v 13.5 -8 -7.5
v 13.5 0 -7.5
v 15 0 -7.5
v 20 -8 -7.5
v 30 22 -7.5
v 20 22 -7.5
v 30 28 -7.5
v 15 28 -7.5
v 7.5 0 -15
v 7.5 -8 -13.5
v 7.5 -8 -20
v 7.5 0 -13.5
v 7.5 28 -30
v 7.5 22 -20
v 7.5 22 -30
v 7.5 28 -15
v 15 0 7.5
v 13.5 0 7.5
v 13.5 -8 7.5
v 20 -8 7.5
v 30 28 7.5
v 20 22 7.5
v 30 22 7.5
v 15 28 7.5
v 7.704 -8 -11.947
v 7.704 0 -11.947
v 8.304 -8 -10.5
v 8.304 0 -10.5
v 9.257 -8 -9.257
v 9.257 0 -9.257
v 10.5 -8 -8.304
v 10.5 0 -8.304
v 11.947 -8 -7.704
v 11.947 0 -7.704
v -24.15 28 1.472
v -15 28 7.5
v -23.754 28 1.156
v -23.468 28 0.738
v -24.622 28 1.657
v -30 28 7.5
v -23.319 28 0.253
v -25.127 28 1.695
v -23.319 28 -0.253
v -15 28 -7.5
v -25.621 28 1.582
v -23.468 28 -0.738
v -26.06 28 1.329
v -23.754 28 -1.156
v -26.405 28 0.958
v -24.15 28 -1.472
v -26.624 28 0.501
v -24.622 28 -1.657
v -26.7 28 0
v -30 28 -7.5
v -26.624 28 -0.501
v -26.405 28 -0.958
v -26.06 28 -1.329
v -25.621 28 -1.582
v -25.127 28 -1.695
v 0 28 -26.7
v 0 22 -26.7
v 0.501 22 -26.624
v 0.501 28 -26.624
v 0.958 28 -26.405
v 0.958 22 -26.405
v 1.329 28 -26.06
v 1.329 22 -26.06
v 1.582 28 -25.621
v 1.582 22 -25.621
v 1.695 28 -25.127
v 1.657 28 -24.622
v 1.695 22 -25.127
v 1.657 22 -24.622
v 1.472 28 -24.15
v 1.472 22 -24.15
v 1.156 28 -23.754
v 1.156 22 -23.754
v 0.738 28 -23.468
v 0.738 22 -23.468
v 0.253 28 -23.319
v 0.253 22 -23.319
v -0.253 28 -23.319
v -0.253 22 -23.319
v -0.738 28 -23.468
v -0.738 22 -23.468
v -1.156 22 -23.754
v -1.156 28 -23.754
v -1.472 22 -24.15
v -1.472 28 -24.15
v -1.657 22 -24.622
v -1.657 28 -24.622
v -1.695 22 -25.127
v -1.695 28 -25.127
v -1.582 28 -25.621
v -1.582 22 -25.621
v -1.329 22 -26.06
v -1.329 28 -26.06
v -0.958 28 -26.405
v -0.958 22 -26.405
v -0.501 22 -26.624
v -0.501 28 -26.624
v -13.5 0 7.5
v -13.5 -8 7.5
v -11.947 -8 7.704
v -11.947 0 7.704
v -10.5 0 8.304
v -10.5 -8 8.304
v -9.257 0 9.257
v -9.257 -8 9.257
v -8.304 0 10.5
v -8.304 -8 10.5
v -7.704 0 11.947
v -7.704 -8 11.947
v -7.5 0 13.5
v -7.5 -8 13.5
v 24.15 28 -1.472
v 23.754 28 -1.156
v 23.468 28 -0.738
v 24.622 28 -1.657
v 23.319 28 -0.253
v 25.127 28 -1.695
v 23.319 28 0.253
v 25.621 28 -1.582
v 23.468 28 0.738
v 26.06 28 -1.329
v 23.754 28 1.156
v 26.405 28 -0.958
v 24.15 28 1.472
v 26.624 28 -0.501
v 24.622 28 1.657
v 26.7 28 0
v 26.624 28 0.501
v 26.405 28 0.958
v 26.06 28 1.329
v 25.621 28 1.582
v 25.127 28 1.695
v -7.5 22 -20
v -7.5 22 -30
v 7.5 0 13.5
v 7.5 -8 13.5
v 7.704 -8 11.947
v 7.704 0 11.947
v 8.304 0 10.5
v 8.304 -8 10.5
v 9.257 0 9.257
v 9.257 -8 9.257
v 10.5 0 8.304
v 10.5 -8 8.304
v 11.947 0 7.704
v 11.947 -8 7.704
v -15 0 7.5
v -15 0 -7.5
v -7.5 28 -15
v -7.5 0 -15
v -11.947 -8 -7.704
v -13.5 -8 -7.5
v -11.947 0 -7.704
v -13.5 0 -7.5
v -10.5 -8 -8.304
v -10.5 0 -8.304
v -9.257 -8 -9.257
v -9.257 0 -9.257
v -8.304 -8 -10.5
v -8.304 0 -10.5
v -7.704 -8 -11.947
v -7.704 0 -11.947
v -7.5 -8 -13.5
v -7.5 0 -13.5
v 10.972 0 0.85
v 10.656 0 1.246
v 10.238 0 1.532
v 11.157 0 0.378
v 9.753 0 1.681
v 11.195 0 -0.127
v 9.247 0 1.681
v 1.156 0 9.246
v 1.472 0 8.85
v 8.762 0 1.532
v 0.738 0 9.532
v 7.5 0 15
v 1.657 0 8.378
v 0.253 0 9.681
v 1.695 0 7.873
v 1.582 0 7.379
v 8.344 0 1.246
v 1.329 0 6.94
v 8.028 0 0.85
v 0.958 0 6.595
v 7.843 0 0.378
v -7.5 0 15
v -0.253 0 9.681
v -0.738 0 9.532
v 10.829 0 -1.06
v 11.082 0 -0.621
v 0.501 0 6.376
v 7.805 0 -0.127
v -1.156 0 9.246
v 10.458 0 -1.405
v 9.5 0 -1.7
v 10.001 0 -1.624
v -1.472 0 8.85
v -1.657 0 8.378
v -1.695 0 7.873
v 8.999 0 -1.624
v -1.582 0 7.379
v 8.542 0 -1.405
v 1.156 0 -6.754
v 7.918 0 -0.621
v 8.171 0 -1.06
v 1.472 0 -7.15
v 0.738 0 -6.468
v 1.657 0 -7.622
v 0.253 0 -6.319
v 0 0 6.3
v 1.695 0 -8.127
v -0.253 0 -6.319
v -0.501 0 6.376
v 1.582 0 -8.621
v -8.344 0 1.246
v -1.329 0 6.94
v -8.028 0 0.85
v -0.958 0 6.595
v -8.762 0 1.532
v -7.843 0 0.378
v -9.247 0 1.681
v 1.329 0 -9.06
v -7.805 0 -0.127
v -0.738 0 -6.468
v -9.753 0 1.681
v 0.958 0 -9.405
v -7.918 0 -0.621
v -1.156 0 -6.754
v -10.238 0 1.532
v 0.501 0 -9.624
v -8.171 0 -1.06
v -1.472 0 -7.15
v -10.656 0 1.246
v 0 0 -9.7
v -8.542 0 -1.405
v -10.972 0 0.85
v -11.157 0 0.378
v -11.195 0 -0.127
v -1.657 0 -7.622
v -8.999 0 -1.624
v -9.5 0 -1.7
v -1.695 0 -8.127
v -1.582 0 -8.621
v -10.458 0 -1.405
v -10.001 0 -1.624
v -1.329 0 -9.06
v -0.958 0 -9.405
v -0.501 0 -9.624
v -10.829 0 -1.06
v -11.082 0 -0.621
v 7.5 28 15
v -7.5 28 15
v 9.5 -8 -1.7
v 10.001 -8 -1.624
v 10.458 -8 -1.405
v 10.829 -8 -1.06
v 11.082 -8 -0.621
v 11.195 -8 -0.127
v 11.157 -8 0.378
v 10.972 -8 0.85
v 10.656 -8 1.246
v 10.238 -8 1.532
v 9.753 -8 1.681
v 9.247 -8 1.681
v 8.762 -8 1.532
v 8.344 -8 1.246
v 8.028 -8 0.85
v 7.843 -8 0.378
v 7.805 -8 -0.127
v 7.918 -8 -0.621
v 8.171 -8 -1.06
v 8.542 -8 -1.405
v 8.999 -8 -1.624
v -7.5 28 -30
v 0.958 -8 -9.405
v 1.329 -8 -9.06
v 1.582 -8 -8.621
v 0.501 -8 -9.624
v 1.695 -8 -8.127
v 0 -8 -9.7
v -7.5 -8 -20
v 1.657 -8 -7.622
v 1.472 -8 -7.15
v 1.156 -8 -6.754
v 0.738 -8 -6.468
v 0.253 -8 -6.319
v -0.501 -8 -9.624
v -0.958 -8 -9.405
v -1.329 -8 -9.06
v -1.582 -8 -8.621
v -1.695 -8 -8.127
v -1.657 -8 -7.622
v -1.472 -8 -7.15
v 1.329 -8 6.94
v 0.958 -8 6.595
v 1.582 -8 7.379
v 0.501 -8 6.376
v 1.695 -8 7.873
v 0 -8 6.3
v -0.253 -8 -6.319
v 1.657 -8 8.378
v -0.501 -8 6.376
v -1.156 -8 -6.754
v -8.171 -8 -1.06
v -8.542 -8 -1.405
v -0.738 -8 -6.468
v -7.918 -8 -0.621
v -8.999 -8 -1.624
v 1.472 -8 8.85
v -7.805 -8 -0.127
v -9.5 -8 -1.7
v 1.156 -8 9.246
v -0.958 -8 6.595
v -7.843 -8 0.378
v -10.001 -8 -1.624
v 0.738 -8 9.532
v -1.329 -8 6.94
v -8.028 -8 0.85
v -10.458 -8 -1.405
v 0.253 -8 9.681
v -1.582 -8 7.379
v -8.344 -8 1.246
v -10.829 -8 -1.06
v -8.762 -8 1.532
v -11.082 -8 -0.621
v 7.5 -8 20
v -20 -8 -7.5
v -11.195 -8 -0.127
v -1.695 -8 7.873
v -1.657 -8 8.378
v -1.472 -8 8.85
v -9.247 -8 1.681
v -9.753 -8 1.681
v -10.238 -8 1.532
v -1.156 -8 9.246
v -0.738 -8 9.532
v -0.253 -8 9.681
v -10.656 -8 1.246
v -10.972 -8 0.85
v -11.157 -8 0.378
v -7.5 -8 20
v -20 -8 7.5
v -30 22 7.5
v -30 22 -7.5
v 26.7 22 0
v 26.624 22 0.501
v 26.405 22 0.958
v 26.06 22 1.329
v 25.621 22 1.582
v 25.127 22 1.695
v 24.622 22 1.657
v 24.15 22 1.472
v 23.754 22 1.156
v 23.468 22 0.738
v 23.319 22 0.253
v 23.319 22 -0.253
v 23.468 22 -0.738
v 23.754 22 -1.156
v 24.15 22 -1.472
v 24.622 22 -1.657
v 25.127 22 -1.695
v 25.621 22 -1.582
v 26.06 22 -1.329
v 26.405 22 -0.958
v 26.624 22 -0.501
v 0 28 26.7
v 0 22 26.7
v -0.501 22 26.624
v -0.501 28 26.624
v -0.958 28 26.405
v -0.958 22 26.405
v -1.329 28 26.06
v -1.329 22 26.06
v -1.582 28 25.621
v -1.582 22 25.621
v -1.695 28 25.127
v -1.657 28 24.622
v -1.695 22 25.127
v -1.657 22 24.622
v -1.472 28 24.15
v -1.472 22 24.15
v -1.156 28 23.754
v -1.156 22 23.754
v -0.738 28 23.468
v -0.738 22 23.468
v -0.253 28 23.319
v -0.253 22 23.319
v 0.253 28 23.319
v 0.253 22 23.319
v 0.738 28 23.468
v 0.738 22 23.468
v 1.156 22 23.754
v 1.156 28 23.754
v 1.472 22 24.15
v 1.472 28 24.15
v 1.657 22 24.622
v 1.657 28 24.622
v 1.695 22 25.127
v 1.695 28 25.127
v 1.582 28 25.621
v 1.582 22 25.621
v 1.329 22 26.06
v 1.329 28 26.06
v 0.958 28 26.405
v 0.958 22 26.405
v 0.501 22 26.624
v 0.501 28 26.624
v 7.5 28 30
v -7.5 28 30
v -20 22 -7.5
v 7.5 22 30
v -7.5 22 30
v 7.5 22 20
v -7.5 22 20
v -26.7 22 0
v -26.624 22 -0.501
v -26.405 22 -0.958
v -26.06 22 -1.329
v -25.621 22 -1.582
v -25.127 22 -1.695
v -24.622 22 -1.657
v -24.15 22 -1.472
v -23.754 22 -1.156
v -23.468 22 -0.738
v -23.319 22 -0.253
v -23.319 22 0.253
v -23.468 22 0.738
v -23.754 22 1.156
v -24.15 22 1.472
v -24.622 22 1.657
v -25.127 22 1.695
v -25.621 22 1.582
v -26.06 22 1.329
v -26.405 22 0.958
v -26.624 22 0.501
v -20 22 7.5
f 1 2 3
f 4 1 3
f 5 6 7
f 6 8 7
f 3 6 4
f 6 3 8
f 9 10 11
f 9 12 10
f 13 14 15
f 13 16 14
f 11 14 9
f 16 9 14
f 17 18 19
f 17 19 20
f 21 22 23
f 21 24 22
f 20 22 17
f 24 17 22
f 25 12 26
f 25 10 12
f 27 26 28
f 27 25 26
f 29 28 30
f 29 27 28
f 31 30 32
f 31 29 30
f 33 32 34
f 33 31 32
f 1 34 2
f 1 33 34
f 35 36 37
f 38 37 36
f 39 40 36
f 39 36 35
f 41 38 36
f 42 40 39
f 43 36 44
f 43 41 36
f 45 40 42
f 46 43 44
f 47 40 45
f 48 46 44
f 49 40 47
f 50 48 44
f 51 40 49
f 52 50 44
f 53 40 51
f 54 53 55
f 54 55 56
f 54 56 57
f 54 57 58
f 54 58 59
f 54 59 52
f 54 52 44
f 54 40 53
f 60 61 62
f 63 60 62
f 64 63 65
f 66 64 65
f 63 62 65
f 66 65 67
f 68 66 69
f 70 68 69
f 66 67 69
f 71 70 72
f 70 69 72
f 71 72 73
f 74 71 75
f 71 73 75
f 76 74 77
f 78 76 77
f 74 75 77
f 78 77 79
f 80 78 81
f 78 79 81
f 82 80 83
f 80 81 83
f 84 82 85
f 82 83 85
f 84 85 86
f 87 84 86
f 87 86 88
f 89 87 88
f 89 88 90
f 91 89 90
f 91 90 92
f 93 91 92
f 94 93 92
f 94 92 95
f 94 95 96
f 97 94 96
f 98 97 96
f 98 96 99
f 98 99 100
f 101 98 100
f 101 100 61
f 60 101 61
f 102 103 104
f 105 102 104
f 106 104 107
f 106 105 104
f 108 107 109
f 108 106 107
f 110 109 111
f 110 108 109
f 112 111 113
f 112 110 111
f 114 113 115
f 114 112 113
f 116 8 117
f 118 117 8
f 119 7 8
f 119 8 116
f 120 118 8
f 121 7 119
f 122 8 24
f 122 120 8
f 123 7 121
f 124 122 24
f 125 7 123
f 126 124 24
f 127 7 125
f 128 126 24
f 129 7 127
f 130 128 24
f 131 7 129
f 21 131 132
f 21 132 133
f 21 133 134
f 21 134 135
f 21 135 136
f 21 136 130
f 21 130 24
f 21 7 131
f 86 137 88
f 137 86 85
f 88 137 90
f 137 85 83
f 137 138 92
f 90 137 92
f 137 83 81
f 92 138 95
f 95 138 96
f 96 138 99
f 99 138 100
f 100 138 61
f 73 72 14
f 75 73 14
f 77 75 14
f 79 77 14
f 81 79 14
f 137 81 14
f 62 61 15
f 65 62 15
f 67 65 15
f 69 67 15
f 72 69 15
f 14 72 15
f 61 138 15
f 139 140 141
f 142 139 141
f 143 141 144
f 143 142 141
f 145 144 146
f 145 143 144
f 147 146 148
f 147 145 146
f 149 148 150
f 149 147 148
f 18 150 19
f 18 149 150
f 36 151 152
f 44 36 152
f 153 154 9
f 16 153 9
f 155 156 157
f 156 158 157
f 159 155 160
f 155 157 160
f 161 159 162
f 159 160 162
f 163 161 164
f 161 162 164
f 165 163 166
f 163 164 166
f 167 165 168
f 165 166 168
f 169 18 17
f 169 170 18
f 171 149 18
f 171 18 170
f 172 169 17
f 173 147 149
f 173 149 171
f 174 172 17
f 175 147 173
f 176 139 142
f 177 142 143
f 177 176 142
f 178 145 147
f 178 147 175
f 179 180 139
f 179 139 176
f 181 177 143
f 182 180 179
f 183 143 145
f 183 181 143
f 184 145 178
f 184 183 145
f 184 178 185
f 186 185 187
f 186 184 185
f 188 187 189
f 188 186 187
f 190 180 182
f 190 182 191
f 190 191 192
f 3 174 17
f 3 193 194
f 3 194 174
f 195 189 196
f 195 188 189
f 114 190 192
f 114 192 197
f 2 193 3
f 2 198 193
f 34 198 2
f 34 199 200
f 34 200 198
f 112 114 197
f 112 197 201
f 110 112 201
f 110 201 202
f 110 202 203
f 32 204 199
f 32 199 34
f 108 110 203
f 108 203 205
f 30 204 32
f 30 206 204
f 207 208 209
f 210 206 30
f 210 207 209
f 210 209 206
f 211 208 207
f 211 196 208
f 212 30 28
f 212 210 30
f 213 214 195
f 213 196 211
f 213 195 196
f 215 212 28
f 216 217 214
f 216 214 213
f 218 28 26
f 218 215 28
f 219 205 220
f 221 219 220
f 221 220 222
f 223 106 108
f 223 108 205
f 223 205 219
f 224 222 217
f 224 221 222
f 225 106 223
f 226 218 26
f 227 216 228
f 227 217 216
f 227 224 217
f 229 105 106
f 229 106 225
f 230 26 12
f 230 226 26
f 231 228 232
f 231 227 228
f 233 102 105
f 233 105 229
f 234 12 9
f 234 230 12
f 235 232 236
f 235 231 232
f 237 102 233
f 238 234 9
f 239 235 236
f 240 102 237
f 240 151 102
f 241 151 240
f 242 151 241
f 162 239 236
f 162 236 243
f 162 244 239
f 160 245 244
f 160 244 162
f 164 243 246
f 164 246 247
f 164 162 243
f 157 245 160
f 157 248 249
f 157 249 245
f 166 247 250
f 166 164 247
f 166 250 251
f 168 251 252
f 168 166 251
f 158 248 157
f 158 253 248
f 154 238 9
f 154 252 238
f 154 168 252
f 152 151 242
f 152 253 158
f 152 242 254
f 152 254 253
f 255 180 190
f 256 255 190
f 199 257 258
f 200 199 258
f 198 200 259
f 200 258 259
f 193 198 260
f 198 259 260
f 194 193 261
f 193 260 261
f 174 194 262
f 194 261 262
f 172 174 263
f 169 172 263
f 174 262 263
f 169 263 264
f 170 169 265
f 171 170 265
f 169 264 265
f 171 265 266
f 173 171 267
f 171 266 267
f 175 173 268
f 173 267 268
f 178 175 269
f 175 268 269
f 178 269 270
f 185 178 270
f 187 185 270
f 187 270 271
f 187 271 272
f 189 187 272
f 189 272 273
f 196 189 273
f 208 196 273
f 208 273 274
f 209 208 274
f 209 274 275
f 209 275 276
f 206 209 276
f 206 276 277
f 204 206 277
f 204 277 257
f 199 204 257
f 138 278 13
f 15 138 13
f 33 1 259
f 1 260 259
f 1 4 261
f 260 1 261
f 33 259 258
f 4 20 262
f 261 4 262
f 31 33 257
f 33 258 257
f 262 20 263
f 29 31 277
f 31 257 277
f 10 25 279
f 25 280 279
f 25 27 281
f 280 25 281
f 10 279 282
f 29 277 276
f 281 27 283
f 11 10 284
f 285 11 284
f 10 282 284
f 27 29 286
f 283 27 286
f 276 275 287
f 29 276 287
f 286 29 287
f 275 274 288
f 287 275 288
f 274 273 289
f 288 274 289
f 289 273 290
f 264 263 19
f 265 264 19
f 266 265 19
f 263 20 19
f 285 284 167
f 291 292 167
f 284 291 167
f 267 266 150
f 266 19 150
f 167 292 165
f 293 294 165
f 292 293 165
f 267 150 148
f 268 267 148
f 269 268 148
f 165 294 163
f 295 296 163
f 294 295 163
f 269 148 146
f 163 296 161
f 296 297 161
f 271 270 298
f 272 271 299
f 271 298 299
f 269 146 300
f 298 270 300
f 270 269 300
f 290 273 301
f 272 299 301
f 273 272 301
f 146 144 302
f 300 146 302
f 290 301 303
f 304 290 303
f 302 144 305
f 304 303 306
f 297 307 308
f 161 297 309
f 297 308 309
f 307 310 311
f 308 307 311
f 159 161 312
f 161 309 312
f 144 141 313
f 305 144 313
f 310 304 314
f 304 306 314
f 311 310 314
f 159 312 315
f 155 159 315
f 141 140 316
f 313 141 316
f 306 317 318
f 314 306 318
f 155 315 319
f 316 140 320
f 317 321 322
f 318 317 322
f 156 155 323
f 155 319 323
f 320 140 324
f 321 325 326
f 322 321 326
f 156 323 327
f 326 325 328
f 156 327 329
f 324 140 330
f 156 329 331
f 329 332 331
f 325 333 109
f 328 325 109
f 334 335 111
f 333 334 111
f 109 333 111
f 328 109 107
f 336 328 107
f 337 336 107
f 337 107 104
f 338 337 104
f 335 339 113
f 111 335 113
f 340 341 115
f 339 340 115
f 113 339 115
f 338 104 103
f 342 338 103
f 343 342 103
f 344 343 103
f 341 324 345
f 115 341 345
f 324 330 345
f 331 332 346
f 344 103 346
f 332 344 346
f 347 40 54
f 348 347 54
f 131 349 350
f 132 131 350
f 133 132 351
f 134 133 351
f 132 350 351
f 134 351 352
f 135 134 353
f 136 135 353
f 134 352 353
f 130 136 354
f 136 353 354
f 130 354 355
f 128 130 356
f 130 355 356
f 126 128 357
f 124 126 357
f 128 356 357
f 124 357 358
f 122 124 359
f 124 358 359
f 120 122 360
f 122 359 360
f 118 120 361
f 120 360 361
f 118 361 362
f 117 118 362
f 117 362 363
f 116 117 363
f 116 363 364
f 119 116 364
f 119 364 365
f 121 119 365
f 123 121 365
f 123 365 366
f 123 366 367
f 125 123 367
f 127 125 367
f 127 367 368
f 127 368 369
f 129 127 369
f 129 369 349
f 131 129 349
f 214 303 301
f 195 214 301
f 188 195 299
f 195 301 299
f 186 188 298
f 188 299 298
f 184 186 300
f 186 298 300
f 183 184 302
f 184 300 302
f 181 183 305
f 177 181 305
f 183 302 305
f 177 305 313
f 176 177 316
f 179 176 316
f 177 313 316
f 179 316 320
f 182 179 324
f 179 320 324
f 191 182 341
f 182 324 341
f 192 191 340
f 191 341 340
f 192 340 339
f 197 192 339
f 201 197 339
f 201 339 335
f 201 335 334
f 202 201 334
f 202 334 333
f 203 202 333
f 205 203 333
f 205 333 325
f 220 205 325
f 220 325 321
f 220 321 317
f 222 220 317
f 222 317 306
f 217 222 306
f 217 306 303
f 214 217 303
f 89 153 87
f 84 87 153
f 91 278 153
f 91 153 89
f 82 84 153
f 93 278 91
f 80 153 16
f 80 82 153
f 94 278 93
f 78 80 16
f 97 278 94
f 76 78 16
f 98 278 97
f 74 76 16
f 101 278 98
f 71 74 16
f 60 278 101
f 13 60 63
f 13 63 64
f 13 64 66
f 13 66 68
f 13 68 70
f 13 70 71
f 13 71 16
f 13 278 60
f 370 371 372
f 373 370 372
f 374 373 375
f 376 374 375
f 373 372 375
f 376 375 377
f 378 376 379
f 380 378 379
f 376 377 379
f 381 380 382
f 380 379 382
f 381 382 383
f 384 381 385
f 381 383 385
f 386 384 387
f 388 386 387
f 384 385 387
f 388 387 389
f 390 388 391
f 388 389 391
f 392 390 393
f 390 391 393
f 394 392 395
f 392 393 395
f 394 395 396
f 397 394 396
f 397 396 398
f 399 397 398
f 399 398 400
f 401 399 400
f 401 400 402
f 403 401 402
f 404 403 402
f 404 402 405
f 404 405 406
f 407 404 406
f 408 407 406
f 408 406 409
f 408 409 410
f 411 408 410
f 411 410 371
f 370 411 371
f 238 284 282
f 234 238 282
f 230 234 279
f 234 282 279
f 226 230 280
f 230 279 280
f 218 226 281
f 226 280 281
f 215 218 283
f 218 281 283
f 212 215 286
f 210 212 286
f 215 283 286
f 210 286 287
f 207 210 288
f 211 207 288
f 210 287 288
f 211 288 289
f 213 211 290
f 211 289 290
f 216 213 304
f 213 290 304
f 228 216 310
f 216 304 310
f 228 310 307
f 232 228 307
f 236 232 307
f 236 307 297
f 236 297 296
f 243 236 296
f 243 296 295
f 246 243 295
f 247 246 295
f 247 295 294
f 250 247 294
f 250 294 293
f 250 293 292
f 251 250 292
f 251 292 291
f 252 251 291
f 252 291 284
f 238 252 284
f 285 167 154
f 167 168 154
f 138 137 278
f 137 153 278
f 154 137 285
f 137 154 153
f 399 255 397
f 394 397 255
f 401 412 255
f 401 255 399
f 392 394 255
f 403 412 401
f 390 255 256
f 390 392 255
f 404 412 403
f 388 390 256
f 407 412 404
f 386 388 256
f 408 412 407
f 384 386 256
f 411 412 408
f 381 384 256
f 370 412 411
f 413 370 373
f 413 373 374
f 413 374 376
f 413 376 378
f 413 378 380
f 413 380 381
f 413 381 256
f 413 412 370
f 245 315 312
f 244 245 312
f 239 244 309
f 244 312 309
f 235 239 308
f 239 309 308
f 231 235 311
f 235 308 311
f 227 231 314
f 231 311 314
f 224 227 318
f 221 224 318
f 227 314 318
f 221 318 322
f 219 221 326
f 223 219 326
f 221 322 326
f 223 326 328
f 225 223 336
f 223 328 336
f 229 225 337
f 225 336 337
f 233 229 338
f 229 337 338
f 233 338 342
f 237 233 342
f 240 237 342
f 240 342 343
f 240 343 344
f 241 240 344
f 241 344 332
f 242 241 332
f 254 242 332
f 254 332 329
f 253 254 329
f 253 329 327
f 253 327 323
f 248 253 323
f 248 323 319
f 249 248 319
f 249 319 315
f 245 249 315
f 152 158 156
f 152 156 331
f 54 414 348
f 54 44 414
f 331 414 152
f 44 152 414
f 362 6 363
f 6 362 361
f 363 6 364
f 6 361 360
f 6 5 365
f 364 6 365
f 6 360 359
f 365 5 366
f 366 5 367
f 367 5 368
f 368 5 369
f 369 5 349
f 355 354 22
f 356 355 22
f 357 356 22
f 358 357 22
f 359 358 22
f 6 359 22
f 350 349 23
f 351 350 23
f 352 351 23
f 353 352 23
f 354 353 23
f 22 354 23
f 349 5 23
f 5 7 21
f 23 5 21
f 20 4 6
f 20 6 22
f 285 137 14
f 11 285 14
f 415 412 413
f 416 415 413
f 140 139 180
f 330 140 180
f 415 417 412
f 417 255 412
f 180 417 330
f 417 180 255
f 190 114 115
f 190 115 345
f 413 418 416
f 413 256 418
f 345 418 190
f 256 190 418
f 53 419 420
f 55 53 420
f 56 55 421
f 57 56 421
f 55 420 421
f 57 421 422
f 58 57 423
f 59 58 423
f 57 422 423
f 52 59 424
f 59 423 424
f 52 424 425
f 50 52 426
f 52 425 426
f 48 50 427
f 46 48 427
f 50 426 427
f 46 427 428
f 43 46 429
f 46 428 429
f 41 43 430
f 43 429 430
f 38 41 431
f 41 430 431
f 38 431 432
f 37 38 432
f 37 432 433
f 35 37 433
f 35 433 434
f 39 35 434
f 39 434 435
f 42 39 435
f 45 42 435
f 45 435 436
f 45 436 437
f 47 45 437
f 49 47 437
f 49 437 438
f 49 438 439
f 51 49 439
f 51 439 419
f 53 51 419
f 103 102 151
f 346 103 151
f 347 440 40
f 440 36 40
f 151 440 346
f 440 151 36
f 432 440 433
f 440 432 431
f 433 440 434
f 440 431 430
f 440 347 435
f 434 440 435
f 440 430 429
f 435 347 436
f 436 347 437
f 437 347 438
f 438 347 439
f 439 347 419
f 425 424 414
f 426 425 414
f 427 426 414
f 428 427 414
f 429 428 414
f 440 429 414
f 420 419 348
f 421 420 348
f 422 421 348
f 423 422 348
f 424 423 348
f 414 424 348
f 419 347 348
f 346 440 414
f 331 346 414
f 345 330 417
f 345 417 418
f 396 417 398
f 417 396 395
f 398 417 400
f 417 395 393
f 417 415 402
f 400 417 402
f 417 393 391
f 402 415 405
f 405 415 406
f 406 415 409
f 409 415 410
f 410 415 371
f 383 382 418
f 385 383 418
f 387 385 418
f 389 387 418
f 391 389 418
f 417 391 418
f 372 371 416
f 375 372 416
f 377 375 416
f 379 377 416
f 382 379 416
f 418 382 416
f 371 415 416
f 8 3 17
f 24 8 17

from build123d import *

# Parameters (mm, degrees)
SKETCH2_W           = 15
SKETCH2_H           = 20
BOSS_EXTRUDE1_DEPTH = 8
SKETCH3_W           = 15
SKETCH3_H           = 5
BOSS_EXTRUDE4_DEPTH = 28
SKETCH6_W           = 15
SKETCH6_H           = 10
BOSS_EXTRUDE5_DEPTH = 6
SKETCH8_R           = 1.7
CUT_EXTRUDE1_DEPTH  = 44.084219849
CIRPATTERN1_COUNT   = 4
FILLET1_R           = 6
SKETCH9_R           = 1.7
CUT_EXTRUDE2_DEPTH  = 56.641710973


with BuildPart() as part:
    # Sketch2 → Boss-Extrude1 (new body)
    with BuildSketch(Plane(origin=(0, 0, 0), x_dir=(1, 0, 0), z_dir=(0, 1, 0))):
        with Locations((0, 10)):
            Rectangle(SKETCH2_W, SKETCH2_H)
    boss_extrude1 = extrude(amount=-BOSS_EXTRUDE1_DEPTH)

    # Sketch3 → Boss-Extrude4 (add)
    with BuildSketch(Plane(origin=(0, 0, 0), x_dir=(1, 0, 0), z_dir=(0, 1, 0))):
        with Locations((0, 17.5)):
            Rectangle(SKETCH3_W, SKETCH3_H)
    boss_extrude4 = extrude(amount=BOSS_EXTRUDE4_DEPTH)

    # Sketch6 → Boss-Extrude5 (add)
    with BuildSketch(Plane(origin=(0, 28, 0), x_dir=(1, 0, 0), z_dir=(0, 1, 0))):
        with Locations((0, 25)):
            Rectangle(SKETCH6_W, SKETCH6_H)
    boss_extrude5 = extrude(amount=-BOSS_EXTRUDE5_DEPTH)

    # Sketch8 → Cut-Extrude1 (cut, through all)
    with BuildSketch(Plane.XZ.offset(-22)):
        with Locations((0, -25)):
            Circle(SKETCH8_R)
    cut_extrude1 = extrude(amount=-CUT_EXTRUDE1_DEPTH, mode=Mode.SUBTRACT)

    # CirPattern1: Boss-Extrude1, Boss-Extrude4, Boss-Extrude5, Cut-Extrude1 ×4 about axis
    cirpattern1_axis = Axis((0, -8.4, 0), (0, 1, 0))
    add([boss_extrude1.rotate(cirpattern1_axis, i * 360 / CIRPATTERN1_COUNT) for i in range(1, CIRPATTERN1_COUNT)])
    add([boss_extrude4.rotate(cirpattern1_axis, i * 360 / CIRPATTERN1_COUNT) for i in range(1, CIRPATTERN1_COUNT)])
    add([boss_extrude5.rotate(cirpattern1_axis, i * 360 / CIRPATTERN1_COUNT) for i in range(1, CIRPATTERN1_COUNT)])
    add([cut_extrude1.rotate(cirpattern1_axis, i * 360 / CIRPATTERN1_COUNT) for i in range(1, CIRPATTERN1_COUNT)], mode=Mode.SUBTRACT)

    # Fillet1
    fillet1_edges = [part.edges().sort_by_distance(p)[0] for p in [
        (7.5, -4, -7.5),
        (7.5, -4, 7.5),
        (-7.5, -4, 7.5),
        (-7.5, -4, -7.5),
    ]]
    fillet(fillet1_edges, radius=FILLET1_R)

    # Sketch9 → Cut-Extrude2 (cut, through all)
    with BuildSketch(Plane.XZ.offset(8)):
        with Locations((0, 8)):
            Circle(SKETCH9_R)
        with Locations((9.5, 0)):
            Circle(SKETCH9_R)
        with Locations((0, -8)):
            Circle(SKETCH9_R)
        with Locations((-9.5, 0)):
            Circle(SKETCH9_R)
    extrude(amount=-CUT_EXTRUDE2_DEPTH, mode=Mode.SUBTRACT)


solid = part.part
